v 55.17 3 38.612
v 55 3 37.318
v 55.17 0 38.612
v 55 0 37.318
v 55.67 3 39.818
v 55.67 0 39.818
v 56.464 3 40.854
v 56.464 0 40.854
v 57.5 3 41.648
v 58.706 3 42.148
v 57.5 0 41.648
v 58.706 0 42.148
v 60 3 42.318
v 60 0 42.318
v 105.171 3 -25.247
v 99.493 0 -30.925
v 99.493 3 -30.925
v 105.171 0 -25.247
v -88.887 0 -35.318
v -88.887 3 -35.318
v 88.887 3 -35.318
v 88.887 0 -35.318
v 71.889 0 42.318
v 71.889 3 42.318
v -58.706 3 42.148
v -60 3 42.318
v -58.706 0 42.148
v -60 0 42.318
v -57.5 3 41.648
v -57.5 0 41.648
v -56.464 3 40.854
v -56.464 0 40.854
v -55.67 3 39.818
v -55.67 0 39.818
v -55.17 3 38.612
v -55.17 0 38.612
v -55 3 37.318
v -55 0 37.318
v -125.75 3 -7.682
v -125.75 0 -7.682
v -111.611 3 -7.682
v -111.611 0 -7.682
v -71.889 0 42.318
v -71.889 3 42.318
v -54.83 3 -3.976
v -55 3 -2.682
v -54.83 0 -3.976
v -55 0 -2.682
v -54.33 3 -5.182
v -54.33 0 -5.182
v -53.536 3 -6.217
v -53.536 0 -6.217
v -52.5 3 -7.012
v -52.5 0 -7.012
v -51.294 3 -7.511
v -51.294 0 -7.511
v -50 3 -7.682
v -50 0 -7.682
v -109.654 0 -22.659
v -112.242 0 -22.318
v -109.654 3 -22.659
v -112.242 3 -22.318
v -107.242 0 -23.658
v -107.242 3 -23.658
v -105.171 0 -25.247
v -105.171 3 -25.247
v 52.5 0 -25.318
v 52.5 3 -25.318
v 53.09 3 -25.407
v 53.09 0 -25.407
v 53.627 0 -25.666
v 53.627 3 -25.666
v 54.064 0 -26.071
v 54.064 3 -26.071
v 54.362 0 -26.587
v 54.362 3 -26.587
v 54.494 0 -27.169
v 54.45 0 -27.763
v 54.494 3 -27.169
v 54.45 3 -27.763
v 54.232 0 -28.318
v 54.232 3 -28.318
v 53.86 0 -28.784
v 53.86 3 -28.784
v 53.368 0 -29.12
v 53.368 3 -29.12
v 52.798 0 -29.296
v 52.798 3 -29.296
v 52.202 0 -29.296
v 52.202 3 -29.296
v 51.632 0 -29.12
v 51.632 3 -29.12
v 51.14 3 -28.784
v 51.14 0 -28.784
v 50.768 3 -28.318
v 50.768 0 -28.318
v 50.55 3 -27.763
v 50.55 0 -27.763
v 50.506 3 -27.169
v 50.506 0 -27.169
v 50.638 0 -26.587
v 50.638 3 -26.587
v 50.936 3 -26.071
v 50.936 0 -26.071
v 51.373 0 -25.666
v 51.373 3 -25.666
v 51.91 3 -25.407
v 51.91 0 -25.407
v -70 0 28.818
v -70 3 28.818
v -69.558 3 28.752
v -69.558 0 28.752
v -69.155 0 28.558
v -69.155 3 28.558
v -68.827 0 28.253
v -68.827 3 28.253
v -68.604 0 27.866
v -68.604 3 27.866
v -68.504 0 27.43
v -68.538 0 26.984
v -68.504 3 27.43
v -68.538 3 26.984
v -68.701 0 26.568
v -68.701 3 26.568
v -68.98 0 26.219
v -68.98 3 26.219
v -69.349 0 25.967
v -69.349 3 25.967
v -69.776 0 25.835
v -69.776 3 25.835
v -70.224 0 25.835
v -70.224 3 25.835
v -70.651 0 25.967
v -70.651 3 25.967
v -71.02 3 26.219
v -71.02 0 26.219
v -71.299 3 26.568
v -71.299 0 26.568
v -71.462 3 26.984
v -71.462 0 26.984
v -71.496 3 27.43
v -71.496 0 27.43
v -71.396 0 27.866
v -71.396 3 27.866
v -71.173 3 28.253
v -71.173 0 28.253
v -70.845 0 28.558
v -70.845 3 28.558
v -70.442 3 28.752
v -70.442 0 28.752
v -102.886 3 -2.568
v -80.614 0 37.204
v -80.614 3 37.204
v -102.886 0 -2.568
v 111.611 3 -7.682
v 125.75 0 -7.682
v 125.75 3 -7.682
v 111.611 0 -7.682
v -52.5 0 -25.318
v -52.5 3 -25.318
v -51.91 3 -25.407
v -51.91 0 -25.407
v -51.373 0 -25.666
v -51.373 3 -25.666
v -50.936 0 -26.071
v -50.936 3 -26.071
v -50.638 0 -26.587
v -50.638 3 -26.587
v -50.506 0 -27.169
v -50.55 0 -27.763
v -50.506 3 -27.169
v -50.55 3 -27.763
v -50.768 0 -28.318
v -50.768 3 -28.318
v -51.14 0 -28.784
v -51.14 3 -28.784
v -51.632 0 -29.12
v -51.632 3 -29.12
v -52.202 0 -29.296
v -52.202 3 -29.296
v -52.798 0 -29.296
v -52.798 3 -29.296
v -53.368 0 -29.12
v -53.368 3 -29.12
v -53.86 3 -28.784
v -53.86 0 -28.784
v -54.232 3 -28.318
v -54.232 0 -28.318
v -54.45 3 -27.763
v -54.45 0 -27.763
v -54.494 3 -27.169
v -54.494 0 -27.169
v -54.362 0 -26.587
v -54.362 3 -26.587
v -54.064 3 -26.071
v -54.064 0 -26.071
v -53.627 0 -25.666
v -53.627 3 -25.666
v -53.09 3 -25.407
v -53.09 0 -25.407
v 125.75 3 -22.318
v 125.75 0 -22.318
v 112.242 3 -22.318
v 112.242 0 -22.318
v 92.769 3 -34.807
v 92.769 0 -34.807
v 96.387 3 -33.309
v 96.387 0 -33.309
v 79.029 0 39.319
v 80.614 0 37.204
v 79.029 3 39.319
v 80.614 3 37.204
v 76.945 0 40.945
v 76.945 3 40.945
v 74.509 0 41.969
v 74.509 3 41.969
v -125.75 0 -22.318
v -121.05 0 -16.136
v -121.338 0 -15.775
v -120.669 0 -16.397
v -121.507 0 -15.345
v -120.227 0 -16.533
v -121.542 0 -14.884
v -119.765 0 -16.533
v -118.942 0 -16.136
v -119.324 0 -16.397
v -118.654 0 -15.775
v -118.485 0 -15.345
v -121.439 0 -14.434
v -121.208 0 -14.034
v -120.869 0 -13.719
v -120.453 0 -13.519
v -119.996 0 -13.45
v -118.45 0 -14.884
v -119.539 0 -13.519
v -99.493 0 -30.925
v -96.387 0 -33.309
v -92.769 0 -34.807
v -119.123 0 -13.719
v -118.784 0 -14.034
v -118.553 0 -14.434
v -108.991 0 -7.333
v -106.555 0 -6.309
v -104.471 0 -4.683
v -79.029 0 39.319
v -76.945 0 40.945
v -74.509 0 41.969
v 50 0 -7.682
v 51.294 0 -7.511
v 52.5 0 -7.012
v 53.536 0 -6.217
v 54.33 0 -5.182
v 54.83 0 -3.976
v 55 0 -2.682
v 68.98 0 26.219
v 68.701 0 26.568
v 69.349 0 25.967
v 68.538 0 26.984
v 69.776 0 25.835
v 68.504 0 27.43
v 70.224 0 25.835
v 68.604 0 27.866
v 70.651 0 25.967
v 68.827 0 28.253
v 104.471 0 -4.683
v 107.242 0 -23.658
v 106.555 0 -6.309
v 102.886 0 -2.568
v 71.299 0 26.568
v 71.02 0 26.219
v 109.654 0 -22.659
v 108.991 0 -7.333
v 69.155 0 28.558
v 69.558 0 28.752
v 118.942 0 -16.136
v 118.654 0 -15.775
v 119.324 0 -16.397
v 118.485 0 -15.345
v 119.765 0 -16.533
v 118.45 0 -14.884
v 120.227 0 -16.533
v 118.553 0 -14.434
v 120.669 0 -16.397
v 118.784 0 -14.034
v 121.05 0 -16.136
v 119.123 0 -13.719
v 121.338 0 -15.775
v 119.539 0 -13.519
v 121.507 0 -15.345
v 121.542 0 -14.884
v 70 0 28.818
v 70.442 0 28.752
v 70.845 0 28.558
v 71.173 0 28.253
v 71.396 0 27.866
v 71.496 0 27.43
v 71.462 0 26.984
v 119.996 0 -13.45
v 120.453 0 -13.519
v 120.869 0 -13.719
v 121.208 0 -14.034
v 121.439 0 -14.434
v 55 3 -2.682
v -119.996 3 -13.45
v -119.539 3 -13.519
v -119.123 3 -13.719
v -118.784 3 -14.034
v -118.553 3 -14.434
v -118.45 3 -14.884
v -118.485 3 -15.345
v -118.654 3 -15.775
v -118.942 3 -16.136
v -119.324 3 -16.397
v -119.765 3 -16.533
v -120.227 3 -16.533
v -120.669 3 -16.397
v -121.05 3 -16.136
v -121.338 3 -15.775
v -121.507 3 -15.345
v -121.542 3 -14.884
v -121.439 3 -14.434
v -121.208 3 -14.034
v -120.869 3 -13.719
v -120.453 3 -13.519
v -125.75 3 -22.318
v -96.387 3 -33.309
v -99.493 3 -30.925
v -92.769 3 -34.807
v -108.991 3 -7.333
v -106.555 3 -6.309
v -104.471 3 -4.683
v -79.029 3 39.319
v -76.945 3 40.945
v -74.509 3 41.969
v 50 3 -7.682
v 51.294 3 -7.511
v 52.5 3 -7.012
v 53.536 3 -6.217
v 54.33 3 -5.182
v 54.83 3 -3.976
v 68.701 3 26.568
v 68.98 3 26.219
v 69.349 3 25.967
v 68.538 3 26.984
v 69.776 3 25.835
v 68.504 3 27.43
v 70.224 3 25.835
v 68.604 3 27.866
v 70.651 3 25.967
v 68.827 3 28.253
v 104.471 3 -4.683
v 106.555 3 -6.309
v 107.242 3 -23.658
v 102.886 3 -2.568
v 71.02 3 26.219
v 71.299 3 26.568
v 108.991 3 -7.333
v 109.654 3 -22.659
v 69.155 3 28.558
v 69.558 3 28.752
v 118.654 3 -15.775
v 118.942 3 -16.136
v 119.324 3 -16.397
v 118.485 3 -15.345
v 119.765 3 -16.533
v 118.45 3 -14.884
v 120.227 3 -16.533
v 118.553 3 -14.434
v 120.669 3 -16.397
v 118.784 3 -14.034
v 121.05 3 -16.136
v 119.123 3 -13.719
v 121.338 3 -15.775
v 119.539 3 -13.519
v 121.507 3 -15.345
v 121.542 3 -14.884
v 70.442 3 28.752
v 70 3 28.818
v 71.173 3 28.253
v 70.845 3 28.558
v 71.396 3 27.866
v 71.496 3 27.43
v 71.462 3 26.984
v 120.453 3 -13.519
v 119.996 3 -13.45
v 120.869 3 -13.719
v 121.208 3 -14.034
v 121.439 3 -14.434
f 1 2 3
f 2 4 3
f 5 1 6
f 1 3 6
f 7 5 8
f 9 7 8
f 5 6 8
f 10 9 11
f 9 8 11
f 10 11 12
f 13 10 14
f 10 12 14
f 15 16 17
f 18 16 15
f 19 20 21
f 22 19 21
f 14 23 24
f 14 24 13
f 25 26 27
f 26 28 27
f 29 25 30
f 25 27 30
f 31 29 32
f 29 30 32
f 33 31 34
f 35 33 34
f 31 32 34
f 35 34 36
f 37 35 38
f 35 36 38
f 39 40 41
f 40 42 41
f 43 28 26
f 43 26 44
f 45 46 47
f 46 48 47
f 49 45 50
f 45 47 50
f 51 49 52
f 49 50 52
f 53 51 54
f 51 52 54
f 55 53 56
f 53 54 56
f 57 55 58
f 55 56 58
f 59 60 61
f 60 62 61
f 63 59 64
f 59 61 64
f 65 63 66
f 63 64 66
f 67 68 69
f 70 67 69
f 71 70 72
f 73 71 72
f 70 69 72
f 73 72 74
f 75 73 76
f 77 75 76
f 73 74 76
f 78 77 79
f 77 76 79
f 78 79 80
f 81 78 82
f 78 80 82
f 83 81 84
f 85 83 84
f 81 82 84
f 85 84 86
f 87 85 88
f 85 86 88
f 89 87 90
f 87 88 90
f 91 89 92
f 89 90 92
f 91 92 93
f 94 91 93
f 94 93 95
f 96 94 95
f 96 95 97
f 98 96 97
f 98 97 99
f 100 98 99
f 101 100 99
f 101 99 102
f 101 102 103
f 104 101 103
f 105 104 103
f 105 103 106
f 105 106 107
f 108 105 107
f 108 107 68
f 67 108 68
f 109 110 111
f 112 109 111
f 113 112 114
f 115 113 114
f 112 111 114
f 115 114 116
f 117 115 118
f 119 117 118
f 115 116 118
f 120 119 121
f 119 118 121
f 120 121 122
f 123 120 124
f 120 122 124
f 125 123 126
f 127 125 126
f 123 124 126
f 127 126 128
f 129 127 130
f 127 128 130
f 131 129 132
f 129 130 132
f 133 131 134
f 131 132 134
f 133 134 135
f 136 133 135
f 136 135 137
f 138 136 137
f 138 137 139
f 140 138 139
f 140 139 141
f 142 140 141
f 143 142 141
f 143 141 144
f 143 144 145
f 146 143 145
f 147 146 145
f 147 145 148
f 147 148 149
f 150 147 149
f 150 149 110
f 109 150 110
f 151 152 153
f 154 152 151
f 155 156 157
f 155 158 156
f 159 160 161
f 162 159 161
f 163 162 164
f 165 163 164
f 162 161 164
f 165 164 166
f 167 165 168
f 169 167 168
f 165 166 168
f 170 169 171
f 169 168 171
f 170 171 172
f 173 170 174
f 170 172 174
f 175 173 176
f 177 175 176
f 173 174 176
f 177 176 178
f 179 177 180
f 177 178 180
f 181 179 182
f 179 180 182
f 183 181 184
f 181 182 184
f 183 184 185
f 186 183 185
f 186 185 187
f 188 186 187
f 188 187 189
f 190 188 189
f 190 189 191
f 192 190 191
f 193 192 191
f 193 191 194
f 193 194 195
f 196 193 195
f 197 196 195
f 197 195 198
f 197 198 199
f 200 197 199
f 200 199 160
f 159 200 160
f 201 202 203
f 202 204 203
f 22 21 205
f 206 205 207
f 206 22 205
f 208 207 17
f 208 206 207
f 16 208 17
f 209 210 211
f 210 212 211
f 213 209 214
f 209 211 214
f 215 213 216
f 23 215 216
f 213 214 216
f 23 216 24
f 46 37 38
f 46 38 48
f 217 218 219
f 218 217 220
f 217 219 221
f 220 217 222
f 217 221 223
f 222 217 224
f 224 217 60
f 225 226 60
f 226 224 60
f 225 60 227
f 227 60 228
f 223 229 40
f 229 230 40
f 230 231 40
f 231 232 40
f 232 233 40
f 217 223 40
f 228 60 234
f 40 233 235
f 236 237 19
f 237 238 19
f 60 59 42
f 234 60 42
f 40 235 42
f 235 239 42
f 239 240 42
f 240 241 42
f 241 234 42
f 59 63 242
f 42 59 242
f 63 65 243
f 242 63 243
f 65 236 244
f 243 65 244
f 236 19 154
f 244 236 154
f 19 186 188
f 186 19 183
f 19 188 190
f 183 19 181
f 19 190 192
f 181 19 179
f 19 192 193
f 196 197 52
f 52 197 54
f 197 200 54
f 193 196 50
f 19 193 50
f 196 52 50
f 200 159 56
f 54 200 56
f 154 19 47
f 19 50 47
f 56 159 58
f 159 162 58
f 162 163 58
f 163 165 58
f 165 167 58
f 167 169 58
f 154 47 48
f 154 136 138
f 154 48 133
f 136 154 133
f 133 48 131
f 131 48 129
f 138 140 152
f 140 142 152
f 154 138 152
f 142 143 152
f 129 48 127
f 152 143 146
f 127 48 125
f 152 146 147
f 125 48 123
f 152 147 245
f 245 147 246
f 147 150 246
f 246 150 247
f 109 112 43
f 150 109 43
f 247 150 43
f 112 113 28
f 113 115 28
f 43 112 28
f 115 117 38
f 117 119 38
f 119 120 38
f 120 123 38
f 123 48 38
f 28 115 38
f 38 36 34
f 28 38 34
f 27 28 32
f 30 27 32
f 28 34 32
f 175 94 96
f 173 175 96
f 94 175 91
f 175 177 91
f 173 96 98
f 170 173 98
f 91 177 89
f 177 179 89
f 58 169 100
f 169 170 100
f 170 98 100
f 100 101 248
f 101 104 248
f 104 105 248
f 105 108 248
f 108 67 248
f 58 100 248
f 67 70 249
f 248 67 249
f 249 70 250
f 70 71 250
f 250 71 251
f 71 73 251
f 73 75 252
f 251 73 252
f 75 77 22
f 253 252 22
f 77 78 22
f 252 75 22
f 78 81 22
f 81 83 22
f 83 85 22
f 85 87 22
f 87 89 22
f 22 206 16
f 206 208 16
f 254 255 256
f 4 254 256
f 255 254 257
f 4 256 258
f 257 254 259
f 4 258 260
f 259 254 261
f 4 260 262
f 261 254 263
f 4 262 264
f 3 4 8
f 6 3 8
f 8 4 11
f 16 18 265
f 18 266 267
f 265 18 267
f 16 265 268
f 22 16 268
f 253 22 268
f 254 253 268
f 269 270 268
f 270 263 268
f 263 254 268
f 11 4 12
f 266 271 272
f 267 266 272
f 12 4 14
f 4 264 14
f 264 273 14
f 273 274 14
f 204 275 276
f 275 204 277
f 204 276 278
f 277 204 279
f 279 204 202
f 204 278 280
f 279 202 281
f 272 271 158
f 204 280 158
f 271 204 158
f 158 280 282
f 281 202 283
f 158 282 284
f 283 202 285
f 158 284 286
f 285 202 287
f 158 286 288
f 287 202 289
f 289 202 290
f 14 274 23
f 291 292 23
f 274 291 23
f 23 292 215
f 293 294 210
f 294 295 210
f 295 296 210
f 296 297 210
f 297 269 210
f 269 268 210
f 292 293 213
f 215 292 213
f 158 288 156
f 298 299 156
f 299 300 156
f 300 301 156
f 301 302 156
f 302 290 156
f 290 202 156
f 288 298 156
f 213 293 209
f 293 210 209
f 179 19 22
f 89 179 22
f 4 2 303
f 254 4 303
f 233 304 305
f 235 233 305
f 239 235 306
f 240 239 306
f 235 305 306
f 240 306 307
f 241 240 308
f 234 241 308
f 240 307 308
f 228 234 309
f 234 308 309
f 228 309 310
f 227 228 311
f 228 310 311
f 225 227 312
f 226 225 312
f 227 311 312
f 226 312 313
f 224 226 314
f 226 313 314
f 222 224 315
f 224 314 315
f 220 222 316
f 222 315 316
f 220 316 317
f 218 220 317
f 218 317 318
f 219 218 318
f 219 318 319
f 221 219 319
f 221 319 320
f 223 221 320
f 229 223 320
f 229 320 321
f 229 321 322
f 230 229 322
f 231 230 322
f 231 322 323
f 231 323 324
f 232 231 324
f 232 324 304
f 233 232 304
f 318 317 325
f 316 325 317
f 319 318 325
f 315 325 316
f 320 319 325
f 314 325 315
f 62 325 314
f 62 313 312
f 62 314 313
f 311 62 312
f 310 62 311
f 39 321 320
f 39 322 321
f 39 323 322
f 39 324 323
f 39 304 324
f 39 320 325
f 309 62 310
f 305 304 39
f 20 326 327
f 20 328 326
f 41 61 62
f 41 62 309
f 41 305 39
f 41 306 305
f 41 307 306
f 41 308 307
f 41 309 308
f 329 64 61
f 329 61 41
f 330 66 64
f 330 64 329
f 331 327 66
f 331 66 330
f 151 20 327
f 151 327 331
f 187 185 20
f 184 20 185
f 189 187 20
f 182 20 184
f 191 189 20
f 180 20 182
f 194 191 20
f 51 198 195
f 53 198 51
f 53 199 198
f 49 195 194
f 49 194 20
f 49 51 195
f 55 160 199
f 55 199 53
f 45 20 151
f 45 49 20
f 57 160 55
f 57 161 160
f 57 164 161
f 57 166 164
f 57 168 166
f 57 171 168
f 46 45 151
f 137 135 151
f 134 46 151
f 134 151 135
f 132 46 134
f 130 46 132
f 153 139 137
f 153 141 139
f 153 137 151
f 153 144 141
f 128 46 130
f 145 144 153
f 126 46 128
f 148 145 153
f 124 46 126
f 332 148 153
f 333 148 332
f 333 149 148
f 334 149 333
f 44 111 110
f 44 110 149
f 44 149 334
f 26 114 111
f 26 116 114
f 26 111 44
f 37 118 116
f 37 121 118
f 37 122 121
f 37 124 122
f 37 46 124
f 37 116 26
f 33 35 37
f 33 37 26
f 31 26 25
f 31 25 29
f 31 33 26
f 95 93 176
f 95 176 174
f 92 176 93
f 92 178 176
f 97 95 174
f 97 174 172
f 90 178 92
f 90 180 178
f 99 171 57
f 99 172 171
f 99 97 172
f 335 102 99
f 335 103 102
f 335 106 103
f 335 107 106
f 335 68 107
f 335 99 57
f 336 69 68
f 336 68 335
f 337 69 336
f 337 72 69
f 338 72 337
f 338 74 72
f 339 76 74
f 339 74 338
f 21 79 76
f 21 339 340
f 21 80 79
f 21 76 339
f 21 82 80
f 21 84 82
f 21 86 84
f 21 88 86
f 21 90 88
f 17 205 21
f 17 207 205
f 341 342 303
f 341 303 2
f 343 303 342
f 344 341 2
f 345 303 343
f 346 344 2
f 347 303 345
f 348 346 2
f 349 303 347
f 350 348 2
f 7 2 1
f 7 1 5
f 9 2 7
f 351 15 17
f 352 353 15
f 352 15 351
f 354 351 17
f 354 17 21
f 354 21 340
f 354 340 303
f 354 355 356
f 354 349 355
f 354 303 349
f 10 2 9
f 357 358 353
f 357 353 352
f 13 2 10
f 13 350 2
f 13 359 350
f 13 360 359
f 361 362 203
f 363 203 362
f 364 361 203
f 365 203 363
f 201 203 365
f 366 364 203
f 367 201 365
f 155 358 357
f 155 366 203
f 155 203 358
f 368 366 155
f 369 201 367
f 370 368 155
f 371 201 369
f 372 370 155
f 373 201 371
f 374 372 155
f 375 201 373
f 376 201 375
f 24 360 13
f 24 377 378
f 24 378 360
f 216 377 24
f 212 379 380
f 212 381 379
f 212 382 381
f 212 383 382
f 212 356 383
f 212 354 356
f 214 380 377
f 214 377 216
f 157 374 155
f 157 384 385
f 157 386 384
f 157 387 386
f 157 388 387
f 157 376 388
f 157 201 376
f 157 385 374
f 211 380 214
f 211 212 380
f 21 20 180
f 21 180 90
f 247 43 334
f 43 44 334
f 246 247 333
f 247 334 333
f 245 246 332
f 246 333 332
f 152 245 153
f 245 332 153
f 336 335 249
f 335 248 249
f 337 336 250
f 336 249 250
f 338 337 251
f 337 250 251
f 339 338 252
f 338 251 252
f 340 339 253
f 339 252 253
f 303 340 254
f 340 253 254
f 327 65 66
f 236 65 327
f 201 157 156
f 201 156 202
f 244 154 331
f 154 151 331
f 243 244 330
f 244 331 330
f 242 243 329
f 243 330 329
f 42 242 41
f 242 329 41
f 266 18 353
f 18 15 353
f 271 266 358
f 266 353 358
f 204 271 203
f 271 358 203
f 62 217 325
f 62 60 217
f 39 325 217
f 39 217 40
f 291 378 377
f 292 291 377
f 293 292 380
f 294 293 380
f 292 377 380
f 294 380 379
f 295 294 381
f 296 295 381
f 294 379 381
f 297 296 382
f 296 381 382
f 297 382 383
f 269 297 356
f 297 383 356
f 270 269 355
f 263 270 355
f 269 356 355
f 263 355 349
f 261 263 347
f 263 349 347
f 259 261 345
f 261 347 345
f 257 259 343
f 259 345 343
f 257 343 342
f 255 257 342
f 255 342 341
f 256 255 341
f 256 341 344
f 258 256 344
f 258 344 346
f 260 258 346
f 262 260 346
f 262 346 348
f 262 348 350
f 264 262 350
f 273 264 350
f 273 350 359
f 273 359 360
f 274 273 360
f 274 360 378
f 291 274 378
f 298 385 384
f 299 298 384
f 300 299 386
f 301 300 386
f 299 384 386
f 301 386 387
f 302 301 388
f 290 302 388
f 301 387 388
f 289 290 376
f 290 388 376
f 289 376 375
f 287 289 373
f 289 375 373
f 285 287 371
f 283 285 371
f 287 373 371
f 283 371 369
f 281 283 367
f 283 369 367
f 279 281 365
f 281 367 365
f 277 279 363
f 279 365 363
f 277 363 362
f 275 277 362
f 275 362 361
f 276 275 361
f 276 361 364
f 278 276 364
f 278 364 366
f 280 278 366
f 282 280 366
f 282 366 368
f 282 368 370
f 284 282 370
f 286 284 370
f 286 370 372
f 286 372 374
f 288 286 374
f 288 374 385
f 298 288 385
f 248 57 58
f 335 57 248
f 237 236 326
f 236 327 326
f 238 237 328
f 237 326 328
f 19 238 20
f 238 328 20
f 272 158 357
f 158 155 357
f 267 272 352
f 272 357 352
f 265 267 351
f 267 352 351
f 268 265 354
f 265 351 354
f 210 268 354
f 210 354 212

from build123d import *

# Parameters (mm, degrees)
SALIENTE_EXTRUIR1_DEPTH = 3
REDONDEO1_R             = 10
CROQUIS2_R              = 1.5
CROQUIS2_R_2            = 1.55
CORTAR_EXTRUIR1_DEPTH   = 135.610141171
CROQUIS4_W              = 110
CROQUIS4_H              = 50
CORTAR_EXTRUIR2_DEPTH   = 135.610141171
REDONDEO2_R             = 5
CROQUIS5_W              = 4
CROQUIS5_H              = 14.636342218
CORTAR_EXTRUIR3_DEPTH   = 135.610141171
CROQUIS6_W              = 14.636342218
CROQUIS6_H              = 3
SALIENTE_EXTRUIR2_DEPTH = 2
CROQUIS8_W              = 14.636342218
CROQUIS8_H              = 3
SALIENTE_EXTRUIR3_DEPTH = 2
CROQUIS9_W              = 196.2
CROQUIS9_H              = 31.087527503
CORTAR_EXTRUIR4_DEPTH   = 133.713564137
CROQUIS10_R             = 2
CORTAR_EXTRUIR5_DEPTH   = 133.713564137
REDONDEO6_R             = 15


with BuildPart() as part:
    # Croquis1 → Saliente-Extruir1 (new body)
    with BuildSketch(Plane(origin=(0, 0, 0), x_dir=(1, 0, 0), z_dir=(0, 1, 0))):
        Polygon((-88.1, 42.318171109), (88.1, 42.318171109), (108.1, 22.318171109), (127.75, 22.318171109), (127.75, 7.681828891), (105.75, 7.681828891), (77.75, -42.318171109), (-77.75, -42.318171109), (-105.75, 7.681828891), (-127.75, 7.681828891), (-127.75, 22.318171109), (-108.1, 22.318171109), align=None)
    extrude(amount=SALIENTE_EXTRUIR1_DEPTH)

    # Redondeo1
    redondeo1_edges = [part.edges().sort_by_distance(p)[0] for p in [
        (-88.1, 1.5, -42.318171109),
        (88.1, 1.5, -42.318171109),
        (108.1, 1.5, -22.318171109),
        (105.75, 1.5, -7.681828891),
        (77.75, 1.5, 42.318171109),
        (-77.75, 1.5, 42.318171109),
        (-105.75, 1.5, -7.681828891),
        (-108.1, 1.5, -22.318171109),
    ]]
    fillet(redondeo1_edges, radius=REDONDEO1_R)

    # Croquis2 → Cortar-Extruir1 (cut, through all)
    with BuildSketch(Plane(origin=(0, 3, 0), x_dir=(1, 0, 0), z_dir=(0, 1, 0))):
        with Locations(Location((70, -27.318171109, 0), (0, 0, 270))):
            Circle(CROQUIS2_R)
        with Locations(Location((-70, -27.318171109, 0), (0, 0, 270))):
            Circle(CROQUIS2_R)
        with Locations(Location((-119.996067812, 15, 0), (0, 0, 270))):
            Circle(CROQUIS2_R_2)
        with Locations(Location((119.996067812, 15, 0), (0, 0, 270))):
            Circle(CROQUIS2_R_2)
        with Locations(Location((-17.5, -17.318171109, 0), (0, 0, 270))):
            Circle(CROQUIS2_R)
        with Locations(Location((17.5, -17.318171109, 0), (0, 0, 270))):
            Circle(CROQUIS2_R)
        with Locations(Location((-17.5, -37.318171109, 0), (0, 0, 270))):
            Circle(CROQUIS2_R)
        with Locations(Location((17.5, -37.318171109, 0), (0, 0, 270))):
            Circle(CROQUIS2_R)
    extrude(amount=-CORTAR_EXTRUIR1_DEPTH, mode=Mode.SUBTRACT)

    # Croquis4 → Cortar-Extruir2 (cut, through all)
    with BuildSketch(Plane(origin=(0, 3, 0), x_dir=(1, 0, 0), z_dir=(0, 1, 0))):
        with Locations((0, -17.318171109)):
            Rectangle(CROQUIS4_W, CROQUIS4_H)
    extrude(amount=-CORTAR_EXTRUIR2_DEPTH, mode=Mode.SUBTRACT)

    # Redondeo2
    redondeo2_edges = [part.edges().sort_by_distance(p)[0] for p in [
        (55, 1.5, 42.318171109),
        (-55, 1.5, 42.318171109),
        (-55, 1.5, -7.681828891),
        (55, 1.5, -7.681828891),
    ]]
    fillet(redondeo2_edges, radius=REDONDEO2_R)

    # Croquis5 → Cortar-Extruir3 (cut, through all)
    with BuildSketch(Plane(origin=(0, 3, 0), x_dir=(1, 0, 0), z_dir=(0, 1, 0))):
        with Locations((-125.75, 15)):
            Rectangle(CROQUIS5_W, CROQUIS5_H)
        with Locations((125.75, 15)):
            Rectangle(CROQUIS5_W, CROQUIS5_H)
    extrude(amount=-CORTAR_EXTRUIR3_DEPTH, mode=Mode.SUBTRACT)

    # Croquis6 → Saliente-Extruir2 (add)
    with BuildSketch(Plane(origin=(123.75, 0, 0), x_dir=(0, 0, -1), z_dir=(1, 0, 0))):
        with Locations((15, 1.5)):
            Rectangle(CROQUIS6_W, CROQUIS6_H)
    extrude(amount=SALIENTE_EXTRUIR2_DEPTH)

    # Croquis8 → Saliente-Extruir3 (add)
    with BuildSketch(Plane.ZY.offset(123.75)):
        with Locations((-15, 1.5)):
            Rectangle(CROQUIS8_W, CROQUIS8_H)
    extrude(amount=SALIENTE_EXTRUIR3_DEPTH)

    # Croquis9 → Cortar-Extruir4 (cut, through all)
    with BuildSketch(Plane(origin=(0, 3, 0), x_dir=(1, 0, 0), z_dir=(0, 1, 0))):
        with Locations((0, 50.861934861)):
            Rectangle(CROQUIS9_W, CROQUIS9_H)
    extrude(amount=-CORTAR_EXTRUIR4_DEPTH, mode=Mode.SUBTRACT)

    # Croquis10 → Cortar-Extruir5 (cut, through all)
    with BuildSketch(Plane(origin=(0, 3, 0), x_dir=(1, 0, 0), z_dir=(0, 1, 0))):
        with Locations(Location((-52.5, 27.318171109, 0), (0, 0, 270))):
            Circle(CROQUIS10_R)
        with Locations(Location((52.5, 27.318171109, 0), (0, 0, 270))):
            Circle(CROQUIS10_R)
    extrude(amount=-CORTAR_EXTRUIR5_DEPTH, mode=Mode.SUBTRACT)

    # Redondeo6
    redondeo6_edges = [part.edges().sort_by_distance(p)[0] for p in [
        (-95.1, 1.5, -35.318171109),
        (95.1, 1.5, -35.318171109),
    ]]
    fillet(redondeo6_edges, radius=REDONDEO6_R)


solid = part.part
